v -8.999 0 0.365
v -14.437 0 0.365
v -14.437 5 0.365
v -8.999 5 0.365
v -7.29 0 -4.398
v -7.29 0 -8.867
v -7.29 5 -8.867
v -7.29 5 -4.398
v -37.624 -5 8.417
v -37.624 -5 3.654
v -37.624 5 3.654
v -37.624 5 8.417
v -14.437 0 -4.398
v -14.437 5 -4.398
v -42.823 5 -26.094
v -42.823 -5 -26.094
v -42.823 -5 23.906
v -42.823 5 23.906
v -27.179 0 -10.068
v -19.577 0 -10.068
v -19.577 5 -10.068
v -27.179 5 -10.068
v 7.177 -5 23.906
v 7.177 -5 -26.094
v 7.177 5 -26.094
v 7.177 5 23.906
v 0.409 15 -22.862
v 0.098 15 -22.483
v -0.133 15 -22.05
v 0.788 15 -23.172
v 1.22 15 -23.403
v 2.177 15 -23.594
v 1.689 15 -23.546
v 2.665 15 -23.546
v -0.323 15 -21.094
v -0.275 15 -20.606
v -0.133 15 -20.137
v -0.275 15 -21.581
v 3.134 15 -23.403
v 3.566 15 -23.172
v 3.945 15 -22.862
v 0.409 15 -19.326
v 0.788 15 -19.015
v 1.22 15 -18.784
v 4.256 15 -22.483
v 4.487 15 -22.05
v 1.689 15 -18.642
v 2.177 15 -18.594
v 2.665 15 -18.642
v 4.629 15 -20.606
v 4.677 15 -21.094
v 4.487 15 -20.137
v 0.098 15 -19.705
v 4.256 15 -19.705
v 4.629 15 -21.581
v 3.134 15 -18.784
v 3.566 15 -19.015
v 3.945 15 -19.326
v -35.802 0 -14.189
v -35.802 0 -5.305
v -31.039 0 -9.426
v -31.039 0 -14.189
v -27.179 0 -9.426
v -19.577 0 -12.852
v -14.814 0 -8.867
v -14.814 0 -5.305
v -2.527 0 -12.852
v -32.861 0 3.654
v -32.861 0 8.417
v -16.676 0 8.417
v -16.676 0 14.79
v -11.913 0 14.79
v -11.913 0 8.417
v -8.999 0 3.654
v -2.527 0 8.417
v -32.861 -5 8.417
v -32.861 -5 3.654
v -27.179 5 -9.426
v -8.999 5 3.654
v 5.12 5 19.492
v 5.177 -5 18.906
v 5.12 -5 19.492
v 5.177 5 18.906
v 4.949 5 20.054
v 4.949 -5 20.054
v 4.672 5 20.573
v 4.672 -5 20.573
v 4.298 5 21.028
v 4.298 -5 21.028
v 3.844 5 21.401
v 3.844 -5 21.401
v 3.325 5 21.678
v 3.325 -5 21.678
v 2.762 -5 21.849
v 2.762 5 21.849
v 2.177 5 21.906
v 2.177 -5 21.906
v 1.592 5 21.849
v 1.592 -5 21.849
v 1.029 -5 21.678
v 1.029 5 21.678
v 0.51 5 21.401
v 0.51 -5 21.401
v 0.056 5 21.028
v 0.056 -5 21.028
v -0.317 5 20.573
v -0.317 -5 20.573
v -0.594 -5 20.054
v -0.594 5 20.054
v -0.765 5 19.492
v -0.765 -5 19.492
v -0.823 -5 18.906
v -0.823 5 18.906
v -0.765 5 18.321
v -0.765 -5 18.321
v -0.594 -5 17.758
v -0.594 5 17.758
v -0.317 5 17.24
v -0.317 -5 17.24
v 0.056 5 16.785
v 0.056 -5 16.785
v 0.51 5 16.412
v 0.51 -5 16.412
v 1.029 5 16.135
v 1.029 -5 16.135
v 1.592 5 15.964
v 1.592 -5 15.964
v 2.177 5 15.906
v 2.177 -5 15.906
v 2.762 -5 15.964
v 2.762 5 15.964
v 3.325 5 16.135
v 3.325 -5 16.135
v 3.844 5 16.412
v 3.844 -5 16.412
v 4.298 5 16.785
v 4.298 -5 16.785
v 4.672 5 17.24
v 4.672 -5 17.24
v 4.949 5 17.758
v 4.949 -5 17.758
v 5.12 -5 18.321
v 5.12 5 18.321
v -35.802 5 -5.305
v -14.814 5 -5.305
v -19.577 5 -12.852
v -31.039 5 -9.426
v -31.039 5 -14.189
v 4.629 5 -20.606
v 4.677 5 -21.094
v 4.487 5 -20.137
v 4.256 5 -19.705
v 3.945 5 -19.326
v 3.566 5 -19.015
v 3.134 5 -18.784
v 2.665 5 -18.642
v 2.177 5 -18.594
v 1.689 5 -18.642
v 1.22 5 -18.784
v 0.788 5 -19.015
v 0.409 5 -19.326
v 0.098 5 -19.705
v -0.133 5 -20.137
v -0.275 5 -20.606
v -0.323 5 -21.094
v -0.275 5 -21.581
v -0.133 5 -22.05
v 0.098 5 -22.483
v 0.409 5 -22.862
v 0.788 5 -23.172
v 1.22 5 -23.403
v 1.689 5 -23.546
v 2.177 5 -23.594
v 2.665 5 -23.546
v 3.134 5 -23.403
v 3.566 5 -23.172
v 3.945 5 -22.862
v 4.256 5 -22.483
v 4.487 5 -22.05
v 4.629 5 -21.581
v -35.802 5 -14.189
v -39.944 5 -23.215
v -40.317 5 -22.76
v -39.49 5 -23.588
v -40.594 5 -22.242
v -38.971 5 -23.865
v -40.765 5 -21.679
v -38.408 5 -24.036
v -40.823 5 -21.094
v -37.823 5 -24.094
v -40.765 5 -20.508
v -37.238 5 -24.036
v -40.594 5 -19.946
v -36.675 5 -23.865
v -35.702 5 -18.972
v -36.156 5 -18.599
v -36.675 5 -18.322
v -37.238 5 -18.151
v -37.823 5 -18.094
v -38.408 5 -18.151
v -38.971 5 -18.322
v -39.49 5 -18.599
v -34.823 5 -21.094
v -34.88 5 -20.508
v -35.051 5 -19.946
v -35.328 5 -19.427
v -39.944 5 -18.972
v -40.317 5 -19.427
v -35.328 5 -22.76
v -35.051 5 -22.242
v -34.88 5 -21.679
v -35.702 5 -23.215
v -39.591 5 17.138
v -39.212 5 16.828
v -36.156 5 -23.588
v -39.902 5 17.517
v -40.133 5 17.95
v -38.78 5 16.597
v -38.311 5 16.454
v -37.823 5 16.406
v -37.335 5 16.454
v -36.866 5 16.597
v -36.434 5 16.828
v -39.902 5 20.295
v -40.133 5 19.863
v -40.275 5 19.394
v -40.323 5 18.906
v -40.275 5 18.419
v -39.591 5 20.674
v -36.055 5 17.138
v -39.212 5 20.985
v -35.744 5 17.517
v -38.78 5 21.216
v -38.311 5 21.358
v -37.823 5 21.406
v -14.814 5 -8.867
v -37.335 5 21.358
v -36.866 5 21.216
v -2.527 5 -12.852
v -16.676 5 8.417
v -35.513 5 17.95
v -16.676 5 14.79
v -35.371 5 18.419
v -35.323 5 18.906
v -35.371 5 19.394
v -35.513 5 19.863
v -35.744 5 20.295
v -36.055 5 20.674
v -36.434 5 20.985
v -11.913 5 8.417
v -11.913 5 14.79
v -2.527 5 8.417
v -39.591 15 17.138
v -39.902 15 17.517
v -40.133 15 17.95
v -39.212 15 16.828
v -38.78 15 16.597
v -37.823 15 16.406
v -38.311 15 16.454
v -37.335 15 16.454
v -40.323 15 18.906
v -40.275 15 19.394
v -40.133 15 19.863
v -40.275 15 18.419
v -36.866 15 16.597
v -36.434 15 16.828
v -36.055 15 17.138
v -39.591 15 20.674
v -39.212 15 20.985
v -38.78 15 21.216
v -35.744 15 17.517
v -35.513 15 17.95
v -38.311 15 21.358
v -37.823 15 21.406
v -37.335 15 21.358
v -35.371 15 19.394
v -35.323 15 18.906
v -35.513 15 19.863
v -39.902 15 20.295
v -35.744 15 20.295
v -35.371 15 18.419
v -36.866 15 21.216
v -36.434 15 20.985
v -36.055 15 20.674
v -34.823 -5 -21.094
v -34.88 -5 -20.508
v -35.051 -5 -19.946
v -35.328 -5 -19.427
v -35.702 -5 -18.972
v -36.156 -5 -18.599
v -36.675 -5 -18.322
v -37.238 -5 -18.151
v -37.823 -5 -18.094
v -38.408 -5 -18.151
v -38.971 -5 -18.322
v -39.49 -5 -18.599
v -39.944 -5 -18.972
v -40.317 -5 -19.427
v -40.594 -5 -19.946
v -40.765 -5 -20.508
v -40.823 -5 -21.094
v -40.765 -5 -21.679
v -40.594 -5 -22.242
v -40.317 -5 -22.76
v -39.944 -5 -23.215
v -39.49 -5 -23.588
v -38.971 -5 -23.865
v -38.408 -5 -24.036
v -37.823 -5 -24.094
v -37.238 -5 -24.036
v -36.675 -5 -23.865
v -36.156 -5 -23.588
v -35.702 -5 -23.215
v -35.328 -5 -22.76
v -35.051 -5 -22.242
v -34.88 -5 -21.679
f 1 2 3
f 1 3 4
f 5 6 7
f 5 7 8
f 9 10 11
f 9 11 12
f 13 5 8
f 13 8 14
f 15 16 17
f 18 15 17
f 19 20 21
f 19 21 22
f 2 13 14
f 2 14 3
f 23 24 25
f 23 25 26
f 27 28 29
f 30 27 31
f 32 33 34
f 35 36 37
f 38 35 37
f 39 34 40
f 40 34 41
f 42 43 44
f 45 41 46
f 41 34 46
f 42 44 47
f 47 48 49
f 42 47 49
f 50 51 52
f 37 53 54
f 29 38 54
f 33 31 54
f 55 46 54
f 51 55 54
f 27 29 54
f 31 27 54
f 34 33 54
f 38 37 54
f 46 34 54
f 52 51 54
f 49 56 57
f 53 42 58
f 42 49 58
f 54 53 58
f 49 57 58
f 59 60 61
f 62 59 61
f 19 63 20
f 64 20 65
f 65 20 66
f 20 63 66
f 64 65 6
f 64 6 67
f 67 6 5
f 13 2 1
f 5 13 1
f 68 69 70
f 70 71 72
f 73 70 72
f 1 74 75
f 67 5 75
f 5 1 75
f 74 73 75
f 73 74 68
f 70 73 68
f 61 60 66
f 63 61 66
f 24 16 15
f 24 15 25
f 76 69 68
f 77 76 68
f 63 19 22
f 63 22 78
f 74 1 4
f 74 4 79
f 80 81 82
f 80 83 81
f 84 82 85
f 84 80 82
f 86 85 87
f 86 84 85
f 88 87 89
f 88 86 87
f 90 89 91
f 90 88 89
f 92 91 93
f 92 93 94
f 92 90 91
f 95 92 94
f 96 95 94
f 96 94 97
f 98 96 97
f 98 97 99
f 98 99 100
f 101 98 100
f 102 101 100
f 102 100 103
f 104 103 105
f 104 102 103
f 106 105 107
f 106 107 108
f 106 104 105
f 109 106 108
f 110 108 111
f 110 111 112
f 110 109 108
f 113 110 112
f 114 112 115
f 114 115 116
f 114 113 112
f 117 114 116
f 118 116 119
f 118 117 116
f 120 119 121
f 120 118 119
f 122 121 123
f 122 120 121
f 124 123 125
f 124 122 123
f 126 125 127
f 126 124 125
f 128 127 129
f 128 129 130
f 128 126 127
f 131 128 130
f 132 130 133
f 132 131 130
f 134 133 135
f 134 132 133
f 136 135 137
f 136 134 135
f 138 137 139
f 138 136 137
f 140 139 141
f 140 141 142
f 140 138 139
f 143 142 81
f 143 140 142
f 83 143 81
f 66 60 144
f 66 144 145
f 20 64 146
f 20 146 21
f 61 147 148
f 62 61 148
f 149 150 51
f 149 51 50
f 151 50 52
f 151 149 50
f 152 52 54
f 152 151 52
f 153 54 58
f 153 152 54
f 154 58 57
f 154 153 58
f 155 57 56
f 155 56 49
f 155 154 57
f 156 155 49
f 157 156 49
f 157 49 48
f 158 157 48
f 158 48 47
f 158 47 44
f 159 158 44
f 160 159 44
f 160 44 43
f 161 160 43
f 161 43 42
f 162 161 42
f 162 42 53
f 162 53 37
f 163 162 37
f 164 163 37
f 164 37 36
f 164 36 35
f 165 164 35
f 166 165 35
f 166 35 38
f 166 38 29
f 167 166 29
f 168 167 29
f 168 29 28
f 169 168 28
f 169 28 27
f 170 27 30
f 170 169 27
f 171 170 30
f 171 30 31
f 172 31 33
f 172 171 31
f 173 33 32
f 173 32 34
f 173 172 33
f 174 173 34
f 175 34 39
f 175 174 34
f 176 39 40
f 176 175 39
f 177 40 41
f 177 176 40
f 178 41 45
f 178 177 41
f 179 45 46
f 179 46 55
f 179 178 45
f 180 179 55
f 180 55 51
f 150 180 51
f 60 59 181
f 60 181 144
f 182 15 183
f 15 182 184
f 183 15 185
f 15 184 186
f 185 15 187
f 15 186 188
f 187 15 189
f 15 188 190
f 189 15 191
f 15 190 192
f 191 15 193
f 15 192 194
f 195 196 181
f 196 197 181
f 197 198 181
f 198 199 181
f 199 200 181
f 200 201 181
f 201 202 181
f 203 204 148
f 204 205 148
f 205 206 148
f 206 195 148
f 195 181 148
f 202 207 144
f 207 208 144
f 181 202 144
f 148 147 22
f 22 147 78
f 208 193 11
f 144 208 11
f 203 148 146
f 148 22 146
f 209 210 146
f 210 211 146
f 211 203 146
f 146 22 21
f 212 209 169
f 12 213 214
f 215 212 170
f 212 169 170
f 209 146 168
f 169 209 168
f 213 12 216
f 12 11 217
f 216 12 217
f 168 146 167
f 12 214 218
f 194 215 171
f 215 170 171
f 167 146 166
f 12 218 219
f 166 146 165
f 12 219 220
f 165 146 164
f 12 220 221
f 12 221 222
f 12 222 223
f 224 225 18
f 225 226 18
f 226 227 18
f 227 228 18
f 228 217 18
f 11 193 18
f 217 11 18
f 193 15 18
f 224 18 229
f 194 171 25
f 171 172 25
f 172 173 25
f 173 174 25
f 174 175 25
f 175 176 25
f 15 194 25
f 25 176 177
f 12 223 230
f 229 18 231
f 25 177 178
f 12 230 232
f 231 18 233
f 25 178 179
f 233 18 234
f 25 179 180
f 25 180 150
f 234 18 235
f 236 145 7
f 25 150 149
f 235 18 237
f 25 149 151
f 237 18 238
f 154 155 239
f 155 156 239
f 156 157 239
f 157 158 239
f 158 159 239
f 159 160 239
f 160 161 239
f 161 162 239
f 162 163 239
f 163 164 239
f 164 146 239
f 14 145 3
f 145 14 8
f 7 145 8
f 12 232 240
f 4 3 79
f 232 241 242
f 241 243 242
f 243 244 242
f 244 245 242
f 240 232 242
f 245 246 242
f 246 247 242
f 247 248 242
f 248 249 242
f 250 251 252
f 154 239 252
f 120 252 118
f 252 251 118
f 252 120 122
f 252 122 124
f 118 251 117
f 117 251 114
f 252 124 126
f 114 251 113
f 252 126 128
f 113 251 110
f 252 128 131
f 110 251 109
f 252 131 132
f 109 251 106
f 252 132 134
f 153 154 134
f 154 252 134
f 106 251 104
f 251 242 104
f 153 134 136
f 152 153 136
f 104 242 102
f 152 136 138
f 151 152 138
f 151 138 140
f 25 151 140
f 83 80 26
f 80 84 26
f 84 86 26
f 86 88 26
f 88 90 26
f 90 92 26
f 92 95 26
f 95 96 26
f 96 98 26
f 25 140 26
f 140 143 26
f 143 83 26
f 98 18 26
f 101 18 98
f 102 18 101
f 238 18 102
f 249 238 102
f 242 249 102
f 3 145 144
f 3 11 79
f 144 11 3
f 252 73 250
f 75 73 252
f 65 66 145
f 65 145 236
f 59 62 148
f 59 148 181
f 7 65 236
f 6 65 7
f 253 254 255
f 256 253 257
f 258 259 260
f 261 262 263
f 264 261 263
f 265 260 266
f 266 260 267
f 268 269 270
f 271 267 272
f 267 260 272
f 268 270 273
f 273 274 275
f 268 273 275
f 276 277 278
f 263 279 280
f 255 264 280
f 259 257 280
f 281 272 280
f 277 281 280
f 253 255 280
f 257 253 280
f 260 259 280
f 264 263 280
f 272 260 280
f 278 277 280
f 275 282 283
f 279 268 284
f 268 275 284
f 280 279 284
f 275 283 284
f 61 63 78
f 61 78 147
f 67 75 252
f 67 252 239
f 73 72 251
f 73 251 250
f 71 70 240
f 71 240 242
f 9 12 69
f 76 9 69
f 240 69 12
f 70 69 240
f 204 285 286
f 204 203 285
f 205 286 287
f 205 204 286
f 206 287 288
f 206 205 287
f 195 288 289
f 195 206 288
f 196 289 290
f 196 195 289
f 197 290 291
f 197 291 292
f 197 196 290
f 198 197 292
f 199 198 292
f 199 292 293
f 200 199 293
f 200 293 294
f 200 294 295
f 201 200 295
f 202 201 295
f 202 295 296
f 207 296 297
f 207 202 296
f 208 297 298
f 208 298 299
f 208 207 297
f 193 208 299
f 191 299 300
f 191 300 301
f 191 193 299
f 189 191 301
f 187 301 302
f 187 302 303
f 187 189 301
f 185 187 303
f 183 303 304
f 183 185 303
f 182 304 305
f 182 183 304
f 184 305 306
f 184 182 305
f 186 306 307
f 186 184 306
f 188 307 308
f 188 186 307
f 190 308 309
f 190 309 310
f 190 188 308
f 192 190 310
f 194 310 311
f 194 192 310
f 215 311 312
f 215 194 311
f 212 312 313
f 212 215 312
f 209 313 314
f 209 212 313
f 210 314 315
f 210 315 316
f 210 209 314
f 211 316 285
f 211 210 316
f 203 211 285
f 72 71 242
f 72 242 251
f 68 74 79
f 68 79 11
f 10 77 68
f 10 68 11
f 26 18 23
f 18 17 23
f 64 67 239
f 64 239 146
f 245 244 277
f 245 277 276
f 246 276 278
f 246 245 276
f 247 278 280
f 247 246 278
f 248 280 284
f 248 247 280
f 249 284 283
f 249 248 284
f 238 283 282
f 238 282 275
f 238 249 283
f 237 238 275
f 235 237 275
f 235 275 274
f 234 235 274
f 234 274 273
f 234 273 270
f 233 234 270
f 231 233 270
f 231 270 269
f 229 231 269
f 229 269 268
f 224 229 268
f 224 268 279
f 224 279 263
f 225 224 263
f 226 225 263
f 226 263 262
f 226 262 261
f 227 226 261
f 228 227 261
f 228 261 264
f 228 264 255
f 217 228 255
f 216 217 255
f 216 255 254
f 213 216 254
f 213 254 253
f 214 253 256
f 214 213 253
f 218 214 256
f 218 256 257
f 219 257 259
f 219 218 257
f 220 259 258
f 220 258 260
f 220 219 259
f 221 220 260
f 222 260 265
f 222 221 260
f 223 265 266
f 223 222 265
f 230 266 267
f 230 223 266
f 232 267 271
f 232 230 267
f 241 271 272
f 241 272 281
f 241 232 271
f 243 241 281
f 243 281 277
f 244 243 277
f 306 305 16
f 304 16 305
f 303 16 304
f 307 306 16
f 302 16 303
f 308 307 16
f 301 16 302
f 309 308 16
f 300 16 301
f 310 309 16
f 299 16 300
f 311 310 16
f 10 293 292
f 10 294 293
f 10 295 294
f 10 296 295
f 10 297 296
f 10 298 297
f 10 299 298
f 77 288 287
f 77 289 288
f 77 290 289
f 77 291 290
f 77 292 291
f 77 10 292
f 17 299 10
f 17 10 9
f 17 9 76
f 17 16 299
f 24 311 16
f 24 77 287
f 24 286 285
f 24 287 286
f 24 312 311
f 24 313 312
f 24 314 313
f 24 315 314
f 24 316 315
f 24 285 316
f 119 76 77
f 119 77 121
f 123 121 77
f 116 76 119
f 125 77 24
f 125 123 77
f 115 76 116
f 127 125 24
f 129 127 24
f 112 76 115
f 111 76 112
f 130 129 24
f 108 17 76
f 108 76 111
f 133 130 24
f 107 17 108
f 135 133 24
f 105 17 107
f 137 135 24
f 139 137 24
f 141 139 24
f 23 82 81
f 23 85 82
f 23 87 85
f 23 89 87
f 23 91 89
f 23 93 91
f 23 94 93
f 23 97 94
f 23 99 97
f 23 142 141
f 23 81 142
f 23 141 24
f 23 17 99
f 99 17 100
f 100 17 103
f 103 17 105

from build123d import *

# Parameters (mm, degrees)
F0_W          = 50
F0_H          = 50
F0_R          = 3
F0_R_2        = 2.5
F1_DEPTH      = 5
F0_W_2        = 4.763
F0_H_2        = 4.763
F2_DEPTH      = 5
F3_DEPTH      = 15
F3_DEPTH_BACK = 5


with BuildPart() as f1:
    # F0 (on Front) → F1 (new body, symmetric)
    with BuildSketch(Plane.XZ):
        with Locations((-17.8228546229, -1.0937498882)):
            Rectangle(F0_W, F0_H)
        with Locations((-37.8228546229, -21.0937498882)):
            Circle(F0_R, mode=Mode.SUBTRACT)
        with Locations((2.1771453771, -21.0937498882)):
            Circle(F0_R_2, mode=Mode.SUBTRACT)
        Polygon((-37.6238546229, 8.4166441185), (-32.8608546229, 8.4166441185), (-16.6755962394, 8.4166441185), (-16.6755962394, 14.7900106385), (-11.9125962394, 14.7900106385), (-11.9125962394, 8.4166441185), (-2.5272074943, 8.4166441185), (-2.5272074943, -12.8520363942), (-13.7815852112, -12.8520363942), (-19.5766687393, -12.8520363942), (-19.5766687393, -10.0679453462), (-27.1787202845, -10.0679453462), (-27.1787202845, -9.4257498882), (-31.0388546229, -9.4257498882), (-31.0388546229, -14.1887498882), (-35.8018546229, -14.1887498882), (-35.8018546229, -9.4257498882), (-35.8018546229, -5.3049453462), (-27.1787202845, -5.3049453462), (-14.8136687393, -5.3049453462), (-14.8136687393, -8.8673923165), (-7.2902074943, -8.8673923165), (-7.2902074943, -4.3980097398), (-14.436878264, -4.3980097398), (-14.436878264, 0.3649902602), (-8.9991306886, 0.3649902602), (-8.9991306886, 3.6536441185), (-16.6755962394, 3.6536441185), (-32.8608546229, 3.6536441185), (-37.6238546229, 3.6536441185), align=None, mode=Mode.SUBTRACT)
        with Locations((-37.8228546229, 18.9062501118)):
            Circle(F0_R_2, mode=Mode.SUBTRACT)
        with Locations((2.1771453771, 18.9062501118)):
            Circle(F0_R, mode=Mode.SUBTRACT)
    extrude(amount=F1_DEPTH, both=True)

    # F0 (on Front) → F2 (join)
    with BuildSketch(Plane.XZ):
        Polygon((-16.6755962394, 8.4166441185), (-32.8608546229, 8.4166441185), (-32.8608546229, 3.6536441185), (-16.6755962394, 3.6536441185), (-8.9991306886, 3.6536441185), (-8.9991306886, 0.3649902602), (-14.436878264, 0.3649902602), (-14.436878264, -4.3980097398), (-7.2902074943, -4.3980097398), (-7.2902074943, -8.8673923165), (-14.8136687393, -8.8673923165), (-14.8136687393, -5.3049453462), (-27.1787202845, -5.3049453462), (-35.8018546229, -5.3049453462), (-35.8018546229, -9.4257498882), (-31.0388546229, -9.4257498882), (-27.1787202845, -9.4257498882), (-27.1787202845, -10.0679453462), (-19.5766687393, -10.0679453462), (-19.5766687393, -12.8520363942), (-13.7815852112, -12.8520363942), (-2.5272074943, -12.8520363942), (-2.5272074943, 8.4166441185), (-11.9125962394, 8.4166441185), (-11.9125962394, 14.7900106385), (-16.6755962394, 14.7900106385), align=None)
        with Locations((-33.4203546229, -11.8072498882)):
            Rectangle(F0_W_2, F0_H_2)
    extrude(amount=F2_DEPTH)

    # F0 (on Front) → F3 (join, two sides)
    with BuildSketch(Plane.XZ) as f3_sk:
        with Locations((2.1771453771, -21.0937498882)):
            Circle(F0_R_2)
        with Locations((-37.8228546229, 18.9062501118)):
            Circle(F0_R_2)
    extrude(amount=-F3_DEPTH)
    extrude(f3_sk.sketch, amount=F3_DEPTH_BACK)


solid = f1.part
